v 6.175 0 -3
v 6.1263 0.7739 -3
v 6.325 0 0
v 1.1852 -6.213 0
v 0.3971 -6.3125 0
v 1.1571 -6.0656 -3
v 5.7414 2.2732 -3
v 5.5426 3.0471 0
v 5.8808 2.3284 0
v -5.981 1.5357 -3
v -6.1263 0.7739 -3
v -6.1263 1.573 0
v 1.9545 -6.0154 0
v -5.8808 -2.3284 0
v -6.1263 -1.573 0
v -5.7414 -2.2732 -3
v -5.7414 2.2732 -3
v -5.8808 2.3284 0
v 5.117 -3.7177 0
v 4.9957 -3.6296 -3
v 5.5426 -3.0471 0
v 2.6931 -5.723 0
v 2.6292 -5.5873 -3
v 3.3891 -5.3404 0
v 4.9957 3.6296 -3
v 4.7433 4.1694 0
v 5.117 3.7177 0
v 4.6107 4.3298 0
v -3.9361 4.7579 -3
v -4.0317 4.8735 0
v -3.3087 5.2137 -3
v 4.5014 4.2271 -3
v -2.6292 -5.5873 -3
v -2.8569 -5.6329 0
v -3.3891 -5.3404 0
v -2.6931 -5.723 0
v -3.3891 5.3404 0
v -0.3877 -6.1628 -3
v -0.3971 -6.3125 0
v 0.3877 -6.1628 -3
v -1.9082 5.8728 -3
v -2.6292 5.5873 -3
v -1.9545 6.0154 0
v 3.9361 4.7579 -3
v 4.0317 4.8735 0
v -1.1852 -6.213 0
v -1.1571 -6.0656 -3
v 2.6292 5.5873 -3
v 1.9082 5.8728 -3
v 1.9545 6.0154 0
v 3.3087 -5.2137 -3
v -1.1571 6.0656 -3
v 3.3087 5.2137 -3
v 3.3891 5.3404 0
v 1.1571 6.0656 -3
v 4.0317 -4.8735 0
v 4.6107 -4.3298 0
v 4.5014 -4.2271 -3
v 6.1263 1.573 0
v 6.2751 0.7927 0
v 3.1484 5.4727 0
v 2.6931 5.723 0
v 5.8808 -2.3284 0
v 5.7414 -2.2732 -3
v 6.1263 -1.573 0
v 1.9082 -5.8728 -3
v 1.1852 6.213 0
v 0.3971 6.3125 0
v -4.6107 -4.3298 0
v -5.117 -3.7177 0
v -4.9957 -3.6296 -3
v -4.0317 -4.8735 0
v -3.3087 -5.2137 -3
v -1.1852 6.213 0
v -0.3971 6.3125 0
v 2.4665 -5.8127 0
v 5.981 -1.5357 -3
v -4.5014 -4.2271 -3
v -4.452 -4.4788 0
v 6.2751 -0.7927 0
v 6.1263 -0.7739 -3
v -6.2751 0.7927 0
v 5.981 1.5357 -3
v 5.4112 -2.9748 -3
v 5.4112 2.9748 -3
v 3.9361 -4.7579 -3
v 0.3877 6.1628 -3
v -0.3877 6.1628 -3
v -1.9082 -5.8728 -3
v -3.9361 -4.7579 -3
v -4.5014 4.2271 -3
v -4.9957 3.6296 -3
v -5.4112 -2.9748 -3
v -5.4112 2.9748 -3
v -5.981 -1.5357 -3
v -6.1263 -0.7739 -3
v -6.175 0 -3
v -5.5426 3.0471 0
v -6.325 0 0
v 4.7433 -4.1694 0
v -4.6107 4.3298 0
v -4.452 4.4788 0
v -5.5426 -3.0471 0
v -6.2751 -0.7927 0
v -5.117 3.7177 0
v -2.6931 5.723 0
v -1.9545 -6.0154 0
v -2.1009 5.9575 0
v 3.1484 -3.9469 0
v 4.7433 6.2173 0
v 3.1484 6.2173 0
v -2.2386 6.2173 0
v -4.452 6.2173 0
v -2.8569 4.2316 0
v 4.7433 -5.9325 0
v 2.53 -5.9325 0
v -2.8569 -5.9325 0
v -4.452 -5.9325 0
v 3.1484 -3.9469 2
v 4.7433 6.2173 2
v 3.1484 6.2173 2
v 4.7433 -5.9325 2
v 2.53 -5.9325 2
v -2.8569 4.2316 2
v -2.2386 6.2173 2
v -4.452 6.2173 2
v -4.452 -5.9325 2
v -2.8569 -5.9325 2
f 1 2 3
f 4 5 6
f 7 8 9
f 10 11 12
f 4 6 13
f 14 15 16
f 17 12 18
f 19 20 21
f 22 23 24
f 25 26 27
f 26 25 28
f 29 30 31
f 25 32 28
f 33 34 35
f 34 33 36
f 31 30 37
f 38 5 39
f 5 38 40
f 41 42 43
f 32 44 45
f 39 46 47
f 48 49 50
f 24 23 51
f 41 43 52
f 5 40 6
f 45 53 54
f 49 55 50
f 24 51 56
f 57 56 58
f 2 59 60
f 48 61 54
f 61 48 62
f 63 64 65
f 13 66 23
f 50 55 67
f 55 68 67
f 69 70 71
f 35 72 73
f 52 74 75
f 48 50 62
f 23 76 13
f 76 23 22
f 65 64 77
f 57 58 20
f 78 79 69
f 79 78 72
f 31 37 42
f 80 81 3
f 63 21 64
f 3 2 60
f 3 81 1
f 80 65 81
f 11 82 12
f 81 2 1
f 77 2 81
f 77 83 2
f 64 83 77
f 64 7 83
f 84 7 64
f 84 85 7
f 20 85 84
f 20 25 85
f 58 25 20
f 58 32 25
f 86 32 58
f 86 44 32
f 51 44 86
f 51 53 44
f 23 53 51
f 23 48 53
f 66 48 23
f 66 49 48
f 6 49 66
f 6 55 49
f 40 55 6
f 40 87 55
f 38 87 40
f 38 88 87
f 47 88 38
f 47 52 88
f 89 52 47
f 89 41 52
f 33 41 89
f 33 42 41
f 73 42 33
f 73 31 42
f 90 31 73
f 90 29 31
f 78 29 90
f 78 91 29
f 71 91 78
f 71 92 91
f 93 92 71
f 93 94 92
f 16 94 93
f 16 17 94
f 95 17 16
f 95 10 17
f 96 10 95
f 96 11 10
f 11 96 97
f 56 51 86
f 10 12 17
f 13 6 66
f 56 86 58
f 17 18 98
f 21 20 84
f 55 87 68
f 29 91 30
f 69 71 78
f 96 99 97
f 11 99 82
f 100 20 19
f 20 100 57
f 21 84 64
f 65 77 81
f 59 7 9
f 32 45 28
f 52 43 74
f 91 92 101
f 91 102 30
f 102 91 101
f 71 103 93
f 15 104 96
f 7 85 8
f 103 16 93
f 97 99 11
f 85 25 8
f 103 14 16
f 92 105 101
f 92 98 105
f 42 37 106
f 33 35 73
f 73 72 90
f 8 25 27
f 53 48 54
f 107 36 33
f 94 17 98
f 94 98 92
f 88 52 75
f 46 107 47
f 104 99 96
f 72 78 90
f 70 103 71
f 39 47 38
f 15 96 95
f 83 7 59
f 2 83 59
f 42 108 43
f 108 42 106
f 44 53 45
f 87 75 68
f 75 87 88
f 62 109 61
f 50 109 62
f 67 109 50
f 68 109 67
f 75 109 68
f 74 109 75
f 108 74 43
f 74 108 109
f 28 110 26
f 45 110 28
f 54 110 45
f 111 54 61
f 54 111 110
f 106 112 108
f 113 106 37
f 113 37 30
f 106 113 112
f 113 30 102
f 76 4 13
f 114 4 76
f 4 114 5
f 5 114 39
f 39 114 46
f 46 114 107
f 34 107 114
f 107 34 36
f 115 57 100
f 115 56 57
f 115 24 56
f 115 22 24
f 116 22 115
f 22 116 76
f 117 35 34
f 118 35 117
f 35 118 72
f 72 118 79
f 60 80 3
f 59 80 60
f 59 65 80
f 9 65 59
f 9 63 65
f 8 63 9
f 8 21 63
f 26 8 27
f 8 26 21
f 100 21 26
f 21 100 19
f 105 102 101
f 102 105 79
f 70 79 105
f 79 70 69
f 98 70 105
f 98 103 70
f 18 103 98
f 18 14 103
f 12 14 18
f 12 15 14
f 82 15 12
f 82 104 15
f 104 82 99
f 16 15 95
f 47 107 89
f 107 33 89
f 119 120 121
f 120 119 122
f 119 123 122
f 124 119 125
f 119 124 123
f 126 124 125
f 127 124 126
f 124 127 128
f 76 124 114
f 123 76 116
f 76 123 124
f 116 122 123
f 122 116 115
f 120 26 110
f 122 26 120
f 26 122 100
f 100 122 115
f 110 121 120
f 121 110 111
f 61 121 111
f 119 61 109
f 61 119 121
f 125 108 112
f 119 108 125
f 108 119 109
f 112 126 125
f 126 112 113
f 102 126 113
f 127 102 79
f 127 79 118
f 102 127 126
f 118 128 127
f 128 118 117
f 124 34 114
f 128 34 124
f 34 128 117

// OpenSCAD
$fn = 50;

difference() {
	union() {
		translate(v = [0, 0, -3.0]) {
			cylinder(h = 3, r1 = 6.175, r2 = 6.325);
		}
		linear_extrude(height = 2) {
			text(font = "Impact", halign = "center", size = 12, text = "N", valign = "center");
		}
	}
	union();
}
